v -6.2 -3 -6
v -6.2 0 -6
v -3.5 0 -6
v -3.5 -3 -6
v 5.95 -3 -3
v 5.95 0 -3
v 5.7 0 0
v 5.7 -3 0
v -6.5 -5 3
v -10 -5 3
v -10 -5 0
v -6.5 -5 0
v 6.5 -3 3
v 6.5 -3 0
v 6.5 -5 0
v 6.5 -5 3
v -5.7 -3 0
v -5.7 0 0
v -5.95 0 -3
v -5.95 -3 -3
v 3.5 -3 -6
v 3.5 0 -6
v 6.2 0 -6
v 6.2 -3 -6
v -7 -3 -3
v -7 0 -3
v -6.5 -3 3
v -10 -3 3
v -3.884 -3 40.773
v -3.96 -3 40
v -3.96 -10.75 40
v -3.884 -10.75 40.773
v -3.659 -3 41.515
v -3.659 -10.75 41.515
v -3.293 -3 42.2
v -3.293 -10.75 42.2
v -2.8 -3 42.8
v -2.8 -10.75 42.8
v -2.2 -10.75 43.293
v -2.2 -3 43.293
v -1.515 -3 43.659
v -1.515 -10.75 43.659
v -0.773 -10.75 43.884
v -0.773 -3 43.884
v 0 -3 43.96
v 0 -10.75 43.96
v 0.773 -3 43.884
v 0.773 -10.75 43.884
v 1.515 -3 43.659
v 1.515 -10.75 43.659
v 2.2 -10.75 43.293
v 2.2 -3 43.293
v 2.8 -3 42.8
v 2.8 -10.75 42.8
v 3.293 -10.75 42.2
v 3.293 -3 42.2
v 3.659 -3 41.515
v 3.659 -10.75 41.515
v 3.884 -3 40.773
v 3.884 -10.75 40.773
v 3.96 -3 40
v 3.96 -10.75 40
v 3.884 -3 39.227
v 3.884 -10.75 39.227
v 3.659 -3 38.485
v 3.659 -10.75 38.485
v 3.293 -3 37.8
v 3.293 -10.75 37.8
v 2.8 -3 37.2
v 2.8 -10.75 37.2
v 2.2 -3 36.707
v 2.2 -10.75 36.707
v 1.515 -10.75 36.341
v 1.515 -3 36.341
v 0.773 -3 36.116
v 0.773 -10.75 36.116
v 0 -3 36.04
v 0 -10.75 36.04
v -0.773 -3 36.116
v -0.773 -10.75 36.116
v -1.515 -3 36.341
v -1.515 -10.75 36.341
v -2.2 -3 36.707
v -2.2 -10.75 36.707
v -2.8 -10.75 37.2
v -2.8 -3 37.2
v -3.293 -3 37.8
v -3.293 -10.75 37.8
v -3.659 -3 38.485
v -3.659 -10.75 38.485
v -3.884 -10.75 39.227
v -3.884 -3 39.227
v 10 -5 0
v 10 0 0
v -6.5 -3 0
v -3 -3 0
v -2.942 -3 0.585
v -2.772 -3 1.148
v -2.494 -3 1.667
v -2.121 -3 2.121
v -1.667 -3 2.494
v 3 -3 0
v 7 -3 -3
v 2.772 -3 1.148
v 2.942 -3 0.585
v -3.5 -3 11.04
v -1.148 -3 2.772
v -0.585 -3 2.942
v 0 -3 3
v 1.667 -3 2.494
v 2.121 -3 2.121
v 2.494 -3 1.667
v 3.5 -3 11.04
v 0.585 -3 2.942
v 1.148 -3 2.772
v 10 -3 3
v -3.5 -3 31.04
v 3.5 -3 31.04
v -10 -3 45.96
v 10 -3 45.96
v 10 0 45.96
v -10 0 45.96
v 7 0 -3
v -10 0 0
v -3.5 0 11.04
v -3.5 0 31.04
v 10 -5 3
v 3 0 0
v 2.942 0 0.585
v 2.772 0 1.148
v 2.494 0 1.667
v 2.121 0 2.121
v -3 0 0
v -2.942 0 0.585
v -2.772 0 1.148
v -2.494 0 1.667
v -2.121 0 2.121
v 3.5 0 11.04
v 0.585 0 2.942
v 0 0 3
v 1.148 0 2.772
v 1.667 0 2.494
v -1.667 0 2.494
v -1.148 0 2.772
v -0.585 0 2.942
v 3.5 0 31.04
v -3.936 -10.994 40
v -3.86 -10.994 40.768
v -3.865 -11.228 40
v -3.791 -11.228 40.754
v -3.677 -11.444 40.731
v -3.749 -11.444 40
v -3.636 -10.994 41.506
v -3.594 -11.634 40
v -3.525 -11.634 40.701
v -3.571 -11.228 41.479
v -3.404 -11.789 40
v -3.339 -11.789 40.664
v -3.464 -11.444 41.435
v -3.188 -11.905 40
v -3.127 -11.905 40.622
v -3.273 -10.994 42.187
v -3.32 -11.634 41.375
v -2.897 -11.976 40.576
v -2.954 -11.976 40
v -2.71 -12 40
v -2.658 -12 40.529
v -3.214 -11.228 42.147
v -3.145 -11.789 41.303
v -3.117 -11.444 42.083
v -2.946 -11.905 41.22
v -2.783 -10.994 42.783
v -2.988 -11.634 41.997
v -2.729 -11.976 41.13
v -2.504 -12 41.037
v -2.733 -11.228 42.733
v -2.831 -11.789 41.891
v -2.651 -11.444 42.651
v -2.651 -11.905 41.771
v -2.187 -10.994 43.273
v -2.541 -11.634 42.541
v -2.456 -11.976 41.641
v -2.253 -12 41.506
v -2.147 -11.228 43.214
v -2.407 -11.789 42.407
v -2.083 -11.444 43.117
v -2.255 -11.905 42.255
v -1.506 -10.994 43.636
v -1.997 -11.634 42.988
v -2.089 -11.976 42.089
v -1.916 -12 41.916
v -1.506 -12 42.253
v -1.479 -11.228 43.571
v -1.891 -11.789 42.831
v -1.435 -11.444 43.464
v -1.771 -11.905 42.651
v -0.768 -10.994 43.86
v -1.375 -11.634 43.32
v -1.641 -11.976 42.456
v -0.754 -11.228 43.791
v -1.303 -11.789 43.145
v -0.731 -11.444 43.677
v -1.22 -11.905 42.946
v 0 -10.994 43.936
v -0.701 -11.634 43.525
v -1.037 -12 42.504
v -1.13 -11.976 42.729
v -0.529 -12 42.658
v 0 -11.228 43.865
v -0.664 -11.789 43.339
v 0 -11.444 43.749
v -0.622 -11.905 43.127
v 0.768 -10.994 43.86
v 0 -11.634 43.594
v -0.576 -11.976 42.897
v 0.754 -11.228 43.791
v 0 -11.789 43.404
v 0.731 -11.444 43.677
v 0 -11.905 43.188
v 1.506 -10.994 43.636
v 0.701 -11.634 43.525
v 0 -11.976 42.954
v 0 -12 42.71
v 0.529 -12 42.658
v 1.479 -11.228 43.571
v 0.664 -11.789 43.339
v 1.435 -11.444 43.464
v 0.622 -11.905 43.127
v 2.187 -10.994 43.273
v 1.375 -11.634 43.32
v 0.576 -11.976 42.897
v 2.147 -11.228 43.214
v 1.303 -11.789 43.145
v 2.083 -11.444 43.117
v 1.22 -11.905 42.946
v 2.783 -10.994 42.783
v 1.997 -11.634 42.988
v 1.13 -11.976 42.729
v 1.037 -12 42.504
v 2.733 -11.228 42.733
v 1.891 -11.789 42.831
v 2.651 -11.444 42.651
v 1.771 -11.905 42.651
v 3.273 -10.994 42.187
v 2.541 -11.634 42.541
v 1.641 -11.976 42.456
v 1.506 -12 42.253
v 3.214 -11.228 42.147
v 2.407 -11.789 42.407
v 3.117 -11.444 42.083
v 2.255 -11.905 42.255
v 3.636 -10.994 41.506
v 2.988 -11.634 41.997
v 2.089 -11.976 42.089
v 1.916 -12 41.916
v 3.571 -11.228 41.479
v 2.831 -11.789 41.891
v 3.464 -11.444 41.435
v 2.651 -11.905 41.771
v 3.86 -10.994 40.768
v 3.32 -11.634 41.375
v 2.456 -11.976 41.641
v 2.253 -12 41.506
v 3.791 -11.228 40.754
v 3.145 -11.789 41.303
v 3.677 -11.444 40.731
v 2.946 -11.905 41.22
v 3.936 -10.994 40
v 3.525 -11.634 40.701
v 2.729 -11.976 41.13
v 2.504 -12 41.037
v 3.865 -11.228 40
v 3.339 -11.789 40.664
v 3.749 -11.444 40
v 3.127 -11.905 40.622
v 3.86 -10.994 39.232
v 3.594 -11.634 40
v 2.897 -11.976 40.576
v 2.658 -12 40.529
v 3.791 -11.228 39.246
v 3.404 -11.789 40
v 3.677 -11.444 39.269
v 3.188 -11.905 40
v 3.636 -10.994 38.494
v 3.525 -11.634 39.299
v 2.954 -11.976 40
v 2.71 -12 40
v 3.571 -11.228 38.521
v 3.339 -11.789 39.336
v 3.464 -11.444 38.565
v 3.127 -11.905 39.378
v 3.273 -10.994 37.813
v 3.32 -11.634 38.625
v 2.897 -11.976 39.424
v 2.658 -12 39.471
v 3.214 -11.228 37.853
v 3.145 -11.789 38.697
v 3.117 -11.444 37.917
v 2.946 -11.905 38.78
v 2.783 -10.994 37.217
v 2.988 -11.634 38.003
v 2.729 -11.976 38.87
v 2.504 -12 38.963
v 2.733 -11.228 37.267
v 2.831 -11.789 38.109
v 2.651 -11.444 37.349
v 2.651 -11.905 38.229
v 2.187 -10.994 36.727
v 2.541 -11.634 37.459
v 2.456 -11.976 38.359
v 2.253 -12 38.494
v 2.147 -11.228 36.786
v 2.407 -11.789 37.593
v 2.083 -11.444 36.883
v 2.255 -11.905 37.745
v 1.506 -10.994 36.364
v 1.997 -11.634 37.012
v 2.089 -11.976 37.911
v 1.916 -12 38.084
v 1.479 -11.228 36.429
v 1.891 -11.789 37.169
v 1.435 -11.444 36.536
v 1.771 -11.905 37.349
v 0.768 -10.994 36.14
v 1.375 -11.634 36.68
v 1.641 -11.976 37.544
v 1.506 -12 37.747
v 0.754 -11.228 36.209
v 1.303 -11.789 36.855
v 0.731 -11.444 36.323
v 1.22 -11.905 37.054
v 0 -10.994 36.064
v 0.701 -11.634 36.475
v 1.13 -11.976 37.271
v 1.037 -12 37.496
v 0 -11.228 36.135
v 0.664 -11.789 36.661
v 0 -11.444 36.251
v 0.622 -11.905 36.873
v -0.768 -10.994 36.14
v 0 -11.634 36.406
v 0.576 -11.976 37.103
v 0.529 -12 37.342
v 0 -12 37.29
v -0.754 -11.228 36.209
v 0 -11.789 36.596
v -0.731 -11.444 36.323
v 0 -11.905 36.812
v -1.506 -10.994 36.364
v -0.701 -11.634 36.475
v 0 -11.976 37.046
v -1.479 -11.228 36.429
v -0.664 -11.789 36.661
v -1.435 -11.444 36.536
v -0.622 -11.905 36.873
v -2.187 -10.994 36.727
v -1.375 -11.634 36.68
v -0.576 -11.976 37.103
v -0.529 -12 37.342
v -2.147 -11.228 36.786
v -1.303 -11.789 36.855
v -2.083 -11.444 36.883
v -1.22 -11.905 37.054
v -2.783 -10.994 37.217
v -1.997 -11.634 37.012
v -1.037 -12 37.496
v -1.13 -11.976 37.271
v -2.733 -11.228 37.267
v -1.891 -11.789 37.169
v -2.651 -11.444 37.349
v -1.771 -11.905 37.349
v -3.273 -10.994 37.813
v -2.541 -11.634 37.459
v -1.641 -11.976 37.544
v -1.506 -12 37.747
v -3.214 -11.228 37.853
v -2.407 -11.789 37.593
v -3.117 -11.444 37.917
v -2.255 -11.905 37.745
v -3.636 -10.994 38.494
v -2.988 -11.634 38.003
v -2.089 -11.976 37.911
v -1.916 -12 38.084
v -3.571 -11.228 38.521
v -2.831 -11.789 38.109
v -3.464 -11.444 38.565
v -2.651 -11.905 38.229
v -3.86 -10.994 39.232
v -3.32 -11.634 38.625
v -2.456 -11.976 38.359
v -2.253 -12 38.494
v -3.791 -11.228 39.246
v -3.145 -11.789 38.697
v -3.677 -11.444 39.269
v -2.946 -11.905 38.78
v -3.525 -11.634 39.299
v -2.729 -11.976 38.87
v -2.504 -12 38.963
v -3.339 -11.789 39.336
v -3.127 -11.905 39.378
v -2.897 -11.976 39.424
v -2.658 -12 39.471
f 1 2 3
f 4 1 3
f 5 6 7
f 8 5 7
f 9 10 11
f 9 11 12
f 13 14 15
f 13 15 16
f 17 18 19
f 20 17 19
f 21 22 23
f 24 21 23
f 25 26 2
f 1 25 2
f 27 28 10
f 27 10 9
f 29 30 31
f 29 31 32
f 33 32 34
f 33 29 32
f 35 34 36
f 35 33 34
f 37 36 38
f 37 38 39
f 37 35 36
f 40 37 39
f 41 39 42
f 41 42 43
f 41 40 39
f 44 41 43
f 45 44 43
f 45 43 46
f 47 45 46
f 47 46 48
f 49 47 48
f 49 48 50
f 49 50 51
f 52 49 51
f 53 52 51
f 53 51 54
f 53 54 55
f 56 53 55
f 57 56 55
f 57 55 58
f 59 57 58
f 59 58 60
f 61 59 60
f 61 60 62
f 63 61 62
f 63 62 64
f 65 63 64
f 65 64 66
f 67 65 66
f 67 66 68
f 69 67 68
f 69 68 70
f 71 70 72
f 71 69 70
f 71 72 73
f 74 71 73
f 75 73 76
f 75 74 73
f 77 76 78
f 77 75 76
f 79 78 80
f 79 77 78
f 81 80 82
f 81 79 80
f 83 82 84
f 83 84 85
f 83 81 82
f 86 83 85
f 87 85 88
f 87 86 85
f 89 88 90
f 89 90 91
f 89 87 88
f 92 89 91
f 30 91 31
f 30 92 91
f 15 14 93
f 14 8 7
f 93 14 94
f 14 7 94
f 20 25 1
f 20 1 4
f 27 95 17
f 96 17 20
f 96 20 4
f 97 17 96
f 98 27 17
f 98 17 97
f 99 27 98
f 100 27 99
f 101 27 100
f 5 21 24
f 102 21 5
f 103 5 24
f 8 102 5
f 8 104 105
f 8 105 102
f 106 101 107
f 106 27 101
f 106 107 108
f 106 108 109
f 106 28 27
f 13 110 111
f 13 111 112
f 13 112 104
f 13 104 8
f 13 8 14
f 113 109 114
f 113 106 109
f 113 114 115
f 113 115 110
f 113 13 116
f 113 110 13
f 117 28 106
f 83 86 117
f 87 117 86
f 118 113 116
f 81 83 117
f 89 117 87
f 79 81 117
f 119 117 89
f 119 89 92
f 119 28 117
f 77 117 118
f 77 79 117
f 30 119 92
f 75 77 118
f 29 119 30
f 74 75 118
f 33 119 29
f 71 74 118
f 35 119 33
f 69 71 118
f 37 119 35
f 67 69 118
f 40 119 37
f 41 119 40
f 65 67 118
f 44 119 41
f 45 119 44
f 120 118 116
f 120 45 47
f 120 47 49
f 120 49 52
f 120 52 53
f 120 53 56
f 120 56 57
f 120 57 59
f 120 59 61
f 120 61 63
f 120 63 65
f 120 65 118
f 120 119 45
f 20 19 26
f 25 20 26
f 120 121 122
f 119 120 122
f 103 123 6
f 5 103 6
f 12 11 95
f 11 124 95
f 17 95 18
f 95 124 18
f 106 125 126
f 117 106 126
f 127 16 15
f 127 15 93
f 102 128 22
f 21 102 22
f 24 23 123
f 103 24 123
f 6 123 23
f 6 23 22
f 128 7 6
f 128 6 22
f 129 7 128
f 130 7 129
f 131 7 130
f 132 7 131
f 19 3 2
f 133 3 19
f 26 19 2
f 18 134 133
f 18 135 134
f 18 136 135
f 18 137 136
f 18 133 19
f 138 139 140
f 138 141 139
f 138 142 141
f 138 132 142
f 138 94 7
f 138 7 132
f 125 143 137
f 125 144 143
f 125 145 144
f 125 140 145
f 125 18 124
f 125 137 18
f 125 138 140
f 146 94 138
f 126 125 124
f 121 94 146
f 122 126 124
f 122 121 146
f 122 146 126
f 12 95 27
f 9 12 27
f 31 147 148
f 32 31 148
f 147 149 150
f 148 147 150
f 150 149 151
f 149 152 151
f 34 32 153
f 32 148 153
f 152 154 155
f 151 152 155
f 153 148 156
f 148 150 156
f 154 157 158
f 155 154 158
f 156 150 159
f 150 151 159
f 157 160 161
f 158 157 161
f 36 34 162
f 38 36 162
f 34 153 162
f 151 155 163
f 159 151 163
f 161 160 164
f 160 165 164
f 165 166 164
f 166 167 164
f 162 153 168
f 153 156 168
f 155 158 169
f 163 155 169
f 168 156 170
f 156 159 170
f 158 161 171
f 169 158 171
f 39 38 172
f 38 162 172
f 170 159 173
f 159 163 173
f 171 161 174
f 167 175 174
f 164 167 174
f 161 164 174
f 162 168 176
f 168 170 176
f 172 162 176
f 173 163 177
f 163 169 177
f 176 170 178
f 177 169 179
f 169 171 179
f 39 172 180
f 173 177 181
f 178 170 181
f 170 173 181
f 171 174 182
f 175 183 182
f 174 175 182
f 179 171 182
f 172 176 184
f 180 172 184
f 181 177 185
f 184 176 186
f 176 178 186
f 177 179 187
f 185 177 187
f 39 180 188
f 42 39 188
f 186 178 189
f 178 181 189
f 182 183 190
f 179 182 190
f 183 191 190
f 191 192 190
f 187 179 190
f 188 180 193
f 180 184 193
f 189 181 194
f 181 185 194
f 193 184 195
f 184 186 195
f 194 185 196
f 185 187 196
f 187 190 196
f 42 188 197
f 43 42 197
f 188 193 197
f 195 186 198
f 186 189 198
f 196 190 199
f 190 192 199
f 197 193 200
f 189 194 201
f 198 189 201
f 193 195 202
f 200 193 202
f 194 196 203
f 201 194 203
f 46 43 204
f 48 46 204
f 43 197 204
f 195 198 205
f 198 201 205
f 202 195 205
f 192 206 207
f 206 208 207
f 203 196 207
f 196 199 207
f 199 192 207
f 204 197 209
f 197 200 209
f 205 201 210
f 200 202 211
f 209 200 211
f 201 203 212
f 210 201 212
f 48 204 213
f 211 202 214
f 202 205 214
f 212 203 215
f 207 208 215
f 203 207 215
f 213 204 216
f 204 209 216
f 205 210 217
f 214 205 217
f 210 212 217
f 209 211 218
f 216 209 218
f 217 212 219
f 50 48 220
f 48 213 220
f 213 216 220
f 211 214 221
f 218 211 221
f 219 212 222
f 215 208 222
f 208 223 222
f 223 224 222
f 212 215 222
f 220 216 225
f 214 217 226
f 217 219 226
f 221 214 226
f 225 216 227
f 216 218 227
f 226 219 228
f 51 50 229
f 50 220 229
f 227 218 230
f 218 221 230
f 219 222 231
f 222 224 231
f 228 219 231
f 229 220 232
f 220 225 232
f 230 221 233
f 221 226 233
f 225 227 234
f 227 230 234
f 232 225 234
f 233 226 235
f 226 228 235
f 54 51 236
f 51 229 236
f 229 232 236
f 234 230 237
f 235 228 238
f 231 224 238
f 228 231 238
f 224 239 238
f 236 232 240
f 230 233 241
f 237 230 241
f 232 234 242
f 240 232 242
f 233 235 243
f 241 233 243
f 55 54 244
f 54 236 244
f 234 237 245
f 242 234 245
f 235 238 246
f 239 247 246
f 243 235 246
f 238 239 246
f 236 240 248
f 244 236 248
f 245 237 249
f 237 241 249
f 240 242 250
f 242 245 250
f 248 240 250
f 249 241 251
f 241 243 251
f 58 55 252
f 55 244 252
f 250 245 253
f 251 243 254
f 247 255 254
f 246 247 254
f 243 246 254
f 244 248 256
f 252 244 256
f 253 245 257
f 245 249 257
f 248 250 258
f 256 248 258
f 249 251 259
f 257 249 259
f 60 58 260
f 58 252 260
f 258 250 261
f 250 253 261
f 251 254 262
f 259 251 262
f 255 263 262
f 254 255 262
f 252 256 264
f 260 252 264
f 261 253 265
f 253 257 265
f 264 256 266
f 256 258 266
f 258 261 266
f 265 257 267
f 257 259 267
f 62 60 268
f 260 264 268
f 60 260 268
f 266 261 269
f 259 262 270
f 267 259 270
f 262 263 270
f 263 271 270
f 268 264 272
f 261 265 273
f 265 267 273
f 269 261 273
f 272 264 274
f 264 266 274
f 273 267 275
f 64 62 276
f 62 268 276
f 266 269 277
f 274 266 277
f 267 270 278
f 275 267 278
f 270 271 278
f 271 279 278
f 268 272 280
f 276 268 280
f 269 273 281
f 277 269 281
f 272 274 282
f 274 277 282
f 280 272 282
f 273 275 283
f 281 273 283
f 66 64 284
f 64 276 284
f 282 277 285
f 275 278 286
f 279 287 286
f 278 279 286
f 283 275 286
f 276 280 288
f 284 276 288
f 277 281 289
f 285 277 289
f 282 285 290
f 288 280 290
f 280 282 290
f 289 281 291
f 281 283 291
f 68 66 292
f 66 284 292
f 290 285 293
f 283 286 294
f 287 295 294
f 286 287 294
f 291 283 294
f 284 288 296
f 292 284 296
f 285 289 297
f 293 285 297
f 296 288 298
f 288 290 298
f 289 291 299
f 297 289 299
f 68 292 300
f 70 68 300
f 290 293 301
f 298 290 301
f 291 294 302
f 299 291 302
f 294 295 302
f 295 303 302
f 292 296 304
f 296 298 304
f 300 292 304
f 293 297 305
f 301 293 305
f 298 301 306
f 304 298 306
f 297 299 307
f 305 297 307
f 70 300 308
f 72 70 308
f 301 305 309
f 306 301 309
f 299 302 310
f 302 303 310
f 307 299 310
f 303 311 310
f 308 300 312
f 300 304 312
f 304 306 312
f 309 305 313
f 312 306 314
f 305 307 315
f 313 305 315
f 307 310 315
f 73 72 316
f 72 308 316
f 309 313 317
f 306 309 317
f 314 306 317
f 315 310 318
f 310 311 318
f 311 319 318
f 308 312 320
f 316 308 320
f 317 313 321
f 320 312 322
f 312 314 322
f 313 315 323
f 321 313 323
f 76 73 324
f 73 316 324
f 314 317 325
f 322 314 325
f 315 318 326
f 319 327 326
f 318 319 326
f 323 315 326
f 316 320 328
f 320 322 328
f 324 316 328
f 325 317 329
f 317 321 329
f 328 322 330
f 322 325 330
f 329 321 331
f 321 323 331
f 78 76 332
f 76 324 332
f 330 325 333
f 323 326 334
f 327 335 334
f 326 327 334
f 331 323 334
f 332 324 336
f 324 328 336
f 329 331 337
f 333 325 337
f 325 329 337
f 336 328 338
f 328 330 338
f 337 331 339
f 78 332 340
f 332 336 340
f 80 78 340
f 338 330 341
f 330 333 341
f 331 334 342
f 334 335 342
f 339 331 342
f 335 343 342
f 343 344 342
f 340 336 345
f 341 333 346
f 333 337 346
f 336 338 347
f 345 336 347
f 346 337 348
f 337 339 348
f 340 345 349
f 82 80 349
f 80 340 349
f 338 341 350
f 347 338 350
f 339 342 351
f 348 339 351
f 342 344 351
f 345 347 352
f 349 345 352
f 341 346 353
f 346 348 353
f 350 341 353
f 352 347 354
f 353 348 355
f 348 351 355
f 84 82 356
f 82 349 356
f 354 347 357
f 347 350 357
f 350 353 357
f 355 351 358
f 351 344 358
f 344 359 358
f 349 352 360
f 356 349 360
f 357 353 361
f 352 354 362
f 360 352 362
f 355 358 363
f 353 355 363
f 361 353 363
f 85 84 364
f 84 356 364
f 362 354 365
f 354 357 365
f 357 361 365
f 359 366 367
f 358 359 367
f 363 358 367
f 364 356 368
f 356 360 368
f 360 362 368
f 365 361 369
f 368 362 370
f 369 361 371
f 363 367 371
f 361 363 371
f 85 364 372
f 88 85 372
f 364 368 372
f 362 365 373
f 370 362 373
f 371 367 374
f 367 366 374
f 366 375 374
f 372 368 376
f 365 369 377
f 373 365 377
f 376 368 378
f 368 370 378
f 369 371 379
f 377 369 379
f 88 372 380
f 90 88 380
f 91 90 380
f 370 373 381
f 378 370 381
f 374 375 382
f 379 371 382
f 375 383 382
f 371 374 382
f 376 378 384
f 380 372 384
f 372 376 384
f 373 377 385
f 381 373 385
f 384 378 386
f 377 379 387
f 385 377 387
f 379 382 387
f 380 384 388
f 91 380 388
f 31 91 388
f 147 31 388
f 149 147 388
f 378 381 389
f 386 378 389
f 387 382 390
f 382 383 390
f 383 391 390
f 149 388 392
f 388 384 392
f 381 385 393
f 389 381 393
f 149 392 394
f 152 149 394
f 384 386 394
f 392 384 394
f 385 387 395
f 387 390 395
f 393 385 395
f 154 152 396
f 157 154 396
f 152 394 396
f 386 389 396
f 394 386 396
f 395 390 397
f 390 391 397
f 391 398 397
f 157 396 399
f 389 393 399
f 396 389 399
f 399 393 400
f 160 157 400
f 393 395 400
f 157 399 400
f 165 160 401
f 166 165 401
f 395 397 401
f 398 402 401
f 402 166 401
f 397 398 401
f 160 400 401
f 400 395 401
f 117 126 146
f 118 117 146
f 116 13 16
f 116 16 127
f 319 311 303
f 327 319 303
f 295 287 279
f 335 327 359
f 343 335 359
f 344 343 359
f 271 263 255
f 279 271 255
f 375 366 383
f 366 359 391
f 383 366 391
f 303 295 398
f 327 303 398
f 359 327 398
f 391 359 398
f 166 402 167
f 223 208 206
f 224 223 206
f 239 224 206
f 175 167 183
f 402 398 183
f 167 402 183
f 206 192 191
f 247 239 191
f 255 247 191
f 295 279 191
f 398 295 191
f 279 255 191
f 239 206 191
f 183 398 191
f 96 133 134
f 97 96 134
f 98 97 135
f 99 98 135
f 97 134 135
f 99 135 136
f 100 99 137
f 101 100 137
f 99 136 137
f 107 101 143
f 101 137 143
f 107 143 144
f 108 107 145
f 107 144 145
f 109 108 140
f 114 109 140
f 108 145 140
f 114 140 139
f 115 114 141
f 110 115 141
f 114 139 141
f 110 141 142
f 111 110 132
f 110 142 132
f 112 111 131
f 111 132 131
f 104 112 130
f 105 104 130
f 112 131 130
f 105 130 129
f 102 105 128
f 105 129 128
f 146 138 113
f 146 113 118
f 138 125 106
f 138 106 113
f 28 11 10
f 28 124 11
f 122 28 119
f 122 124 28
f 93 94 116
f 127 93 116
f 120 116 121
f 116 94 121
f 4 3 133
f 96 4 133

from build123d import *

# Parameters (mm, degrees)
F0_W     = 7
F0_H     = 20
F0_R     = 3.96
F1_DEPTH = 3
F2_R     = 3.96
F3_DEPTH = 12
F4_R     = 1.25
F5_W     = 3.5
F5_H     = 3
F6_DEPTH = 2


with BuildPart() as f1:
    # F0 (on Front) → F1 (new body)
    with BuildSketch(Plane.XZ):
        Polygon((5.7, 0), (3, 0), (3.5, -6), (6.2, -6), (7, -3), (5.95, -3), align=None)
        with BuildLine():
            ThreePointArc((-3, 0), (0, 3), (3, 0))
            Line((3, 0), (5.7, 0))
            Line((5.7, 0), (10, 0))
            Line((10, 0), (10, 45.96))
            Line((10, 45.96), (-10, 45.96))
            Line((-10, 45.96), (-10, 0))
            Line((-10, 0), (-5.7, 0))
            Line((-5.7, 0), (-3, 0))
        make_face()
        with Locations((0, 21.04)):
            Rectangle(F0_W, F0_H, mode=Mode.SUBTRACT)
        with Locations((0, 40)):
            Circle(F0_R, mode=Mode.SUBTRACT)
        Polygon((-3.5, -6), (-3, 0), (-5.7, 0), (-5.95, -3), (-7, -3), (-6.2, -6), align=None)
        with Locations((0, 40)):
            Circle(F0_R)
    extrude(amount=F1_DEPTH)

    # F2 (on face) → F3 (join)
    with BuildSketch(Plane(origin=(0, 0, 0), x_dir=(-1, 0, 0), z_dir=(0, 1, 0))):
        with Locations((0, 40)):
            Circle(F2_R)
    extrude(amount=-F3_DEPTH)

    # F4
    f4_edges = [f1.edges().sort_by_distance(p)[0] for p in [
        (3.96, -12, 40),
    ]]
    fillet(f4_edges, radius=F4_R)

    # F5 (on face) → F6 (join)
    with BuildSketch(Plane.XZ.offset(3)):
        with Locations((-8.25, 1.5)):
            Rectangle(F5_W, F5_H)
        with Locations((8.25, 1.5)):
            Rectangle(F5_W, F5_H)
    extrude(amount=F6_DEPTH)


solid = f1.part
